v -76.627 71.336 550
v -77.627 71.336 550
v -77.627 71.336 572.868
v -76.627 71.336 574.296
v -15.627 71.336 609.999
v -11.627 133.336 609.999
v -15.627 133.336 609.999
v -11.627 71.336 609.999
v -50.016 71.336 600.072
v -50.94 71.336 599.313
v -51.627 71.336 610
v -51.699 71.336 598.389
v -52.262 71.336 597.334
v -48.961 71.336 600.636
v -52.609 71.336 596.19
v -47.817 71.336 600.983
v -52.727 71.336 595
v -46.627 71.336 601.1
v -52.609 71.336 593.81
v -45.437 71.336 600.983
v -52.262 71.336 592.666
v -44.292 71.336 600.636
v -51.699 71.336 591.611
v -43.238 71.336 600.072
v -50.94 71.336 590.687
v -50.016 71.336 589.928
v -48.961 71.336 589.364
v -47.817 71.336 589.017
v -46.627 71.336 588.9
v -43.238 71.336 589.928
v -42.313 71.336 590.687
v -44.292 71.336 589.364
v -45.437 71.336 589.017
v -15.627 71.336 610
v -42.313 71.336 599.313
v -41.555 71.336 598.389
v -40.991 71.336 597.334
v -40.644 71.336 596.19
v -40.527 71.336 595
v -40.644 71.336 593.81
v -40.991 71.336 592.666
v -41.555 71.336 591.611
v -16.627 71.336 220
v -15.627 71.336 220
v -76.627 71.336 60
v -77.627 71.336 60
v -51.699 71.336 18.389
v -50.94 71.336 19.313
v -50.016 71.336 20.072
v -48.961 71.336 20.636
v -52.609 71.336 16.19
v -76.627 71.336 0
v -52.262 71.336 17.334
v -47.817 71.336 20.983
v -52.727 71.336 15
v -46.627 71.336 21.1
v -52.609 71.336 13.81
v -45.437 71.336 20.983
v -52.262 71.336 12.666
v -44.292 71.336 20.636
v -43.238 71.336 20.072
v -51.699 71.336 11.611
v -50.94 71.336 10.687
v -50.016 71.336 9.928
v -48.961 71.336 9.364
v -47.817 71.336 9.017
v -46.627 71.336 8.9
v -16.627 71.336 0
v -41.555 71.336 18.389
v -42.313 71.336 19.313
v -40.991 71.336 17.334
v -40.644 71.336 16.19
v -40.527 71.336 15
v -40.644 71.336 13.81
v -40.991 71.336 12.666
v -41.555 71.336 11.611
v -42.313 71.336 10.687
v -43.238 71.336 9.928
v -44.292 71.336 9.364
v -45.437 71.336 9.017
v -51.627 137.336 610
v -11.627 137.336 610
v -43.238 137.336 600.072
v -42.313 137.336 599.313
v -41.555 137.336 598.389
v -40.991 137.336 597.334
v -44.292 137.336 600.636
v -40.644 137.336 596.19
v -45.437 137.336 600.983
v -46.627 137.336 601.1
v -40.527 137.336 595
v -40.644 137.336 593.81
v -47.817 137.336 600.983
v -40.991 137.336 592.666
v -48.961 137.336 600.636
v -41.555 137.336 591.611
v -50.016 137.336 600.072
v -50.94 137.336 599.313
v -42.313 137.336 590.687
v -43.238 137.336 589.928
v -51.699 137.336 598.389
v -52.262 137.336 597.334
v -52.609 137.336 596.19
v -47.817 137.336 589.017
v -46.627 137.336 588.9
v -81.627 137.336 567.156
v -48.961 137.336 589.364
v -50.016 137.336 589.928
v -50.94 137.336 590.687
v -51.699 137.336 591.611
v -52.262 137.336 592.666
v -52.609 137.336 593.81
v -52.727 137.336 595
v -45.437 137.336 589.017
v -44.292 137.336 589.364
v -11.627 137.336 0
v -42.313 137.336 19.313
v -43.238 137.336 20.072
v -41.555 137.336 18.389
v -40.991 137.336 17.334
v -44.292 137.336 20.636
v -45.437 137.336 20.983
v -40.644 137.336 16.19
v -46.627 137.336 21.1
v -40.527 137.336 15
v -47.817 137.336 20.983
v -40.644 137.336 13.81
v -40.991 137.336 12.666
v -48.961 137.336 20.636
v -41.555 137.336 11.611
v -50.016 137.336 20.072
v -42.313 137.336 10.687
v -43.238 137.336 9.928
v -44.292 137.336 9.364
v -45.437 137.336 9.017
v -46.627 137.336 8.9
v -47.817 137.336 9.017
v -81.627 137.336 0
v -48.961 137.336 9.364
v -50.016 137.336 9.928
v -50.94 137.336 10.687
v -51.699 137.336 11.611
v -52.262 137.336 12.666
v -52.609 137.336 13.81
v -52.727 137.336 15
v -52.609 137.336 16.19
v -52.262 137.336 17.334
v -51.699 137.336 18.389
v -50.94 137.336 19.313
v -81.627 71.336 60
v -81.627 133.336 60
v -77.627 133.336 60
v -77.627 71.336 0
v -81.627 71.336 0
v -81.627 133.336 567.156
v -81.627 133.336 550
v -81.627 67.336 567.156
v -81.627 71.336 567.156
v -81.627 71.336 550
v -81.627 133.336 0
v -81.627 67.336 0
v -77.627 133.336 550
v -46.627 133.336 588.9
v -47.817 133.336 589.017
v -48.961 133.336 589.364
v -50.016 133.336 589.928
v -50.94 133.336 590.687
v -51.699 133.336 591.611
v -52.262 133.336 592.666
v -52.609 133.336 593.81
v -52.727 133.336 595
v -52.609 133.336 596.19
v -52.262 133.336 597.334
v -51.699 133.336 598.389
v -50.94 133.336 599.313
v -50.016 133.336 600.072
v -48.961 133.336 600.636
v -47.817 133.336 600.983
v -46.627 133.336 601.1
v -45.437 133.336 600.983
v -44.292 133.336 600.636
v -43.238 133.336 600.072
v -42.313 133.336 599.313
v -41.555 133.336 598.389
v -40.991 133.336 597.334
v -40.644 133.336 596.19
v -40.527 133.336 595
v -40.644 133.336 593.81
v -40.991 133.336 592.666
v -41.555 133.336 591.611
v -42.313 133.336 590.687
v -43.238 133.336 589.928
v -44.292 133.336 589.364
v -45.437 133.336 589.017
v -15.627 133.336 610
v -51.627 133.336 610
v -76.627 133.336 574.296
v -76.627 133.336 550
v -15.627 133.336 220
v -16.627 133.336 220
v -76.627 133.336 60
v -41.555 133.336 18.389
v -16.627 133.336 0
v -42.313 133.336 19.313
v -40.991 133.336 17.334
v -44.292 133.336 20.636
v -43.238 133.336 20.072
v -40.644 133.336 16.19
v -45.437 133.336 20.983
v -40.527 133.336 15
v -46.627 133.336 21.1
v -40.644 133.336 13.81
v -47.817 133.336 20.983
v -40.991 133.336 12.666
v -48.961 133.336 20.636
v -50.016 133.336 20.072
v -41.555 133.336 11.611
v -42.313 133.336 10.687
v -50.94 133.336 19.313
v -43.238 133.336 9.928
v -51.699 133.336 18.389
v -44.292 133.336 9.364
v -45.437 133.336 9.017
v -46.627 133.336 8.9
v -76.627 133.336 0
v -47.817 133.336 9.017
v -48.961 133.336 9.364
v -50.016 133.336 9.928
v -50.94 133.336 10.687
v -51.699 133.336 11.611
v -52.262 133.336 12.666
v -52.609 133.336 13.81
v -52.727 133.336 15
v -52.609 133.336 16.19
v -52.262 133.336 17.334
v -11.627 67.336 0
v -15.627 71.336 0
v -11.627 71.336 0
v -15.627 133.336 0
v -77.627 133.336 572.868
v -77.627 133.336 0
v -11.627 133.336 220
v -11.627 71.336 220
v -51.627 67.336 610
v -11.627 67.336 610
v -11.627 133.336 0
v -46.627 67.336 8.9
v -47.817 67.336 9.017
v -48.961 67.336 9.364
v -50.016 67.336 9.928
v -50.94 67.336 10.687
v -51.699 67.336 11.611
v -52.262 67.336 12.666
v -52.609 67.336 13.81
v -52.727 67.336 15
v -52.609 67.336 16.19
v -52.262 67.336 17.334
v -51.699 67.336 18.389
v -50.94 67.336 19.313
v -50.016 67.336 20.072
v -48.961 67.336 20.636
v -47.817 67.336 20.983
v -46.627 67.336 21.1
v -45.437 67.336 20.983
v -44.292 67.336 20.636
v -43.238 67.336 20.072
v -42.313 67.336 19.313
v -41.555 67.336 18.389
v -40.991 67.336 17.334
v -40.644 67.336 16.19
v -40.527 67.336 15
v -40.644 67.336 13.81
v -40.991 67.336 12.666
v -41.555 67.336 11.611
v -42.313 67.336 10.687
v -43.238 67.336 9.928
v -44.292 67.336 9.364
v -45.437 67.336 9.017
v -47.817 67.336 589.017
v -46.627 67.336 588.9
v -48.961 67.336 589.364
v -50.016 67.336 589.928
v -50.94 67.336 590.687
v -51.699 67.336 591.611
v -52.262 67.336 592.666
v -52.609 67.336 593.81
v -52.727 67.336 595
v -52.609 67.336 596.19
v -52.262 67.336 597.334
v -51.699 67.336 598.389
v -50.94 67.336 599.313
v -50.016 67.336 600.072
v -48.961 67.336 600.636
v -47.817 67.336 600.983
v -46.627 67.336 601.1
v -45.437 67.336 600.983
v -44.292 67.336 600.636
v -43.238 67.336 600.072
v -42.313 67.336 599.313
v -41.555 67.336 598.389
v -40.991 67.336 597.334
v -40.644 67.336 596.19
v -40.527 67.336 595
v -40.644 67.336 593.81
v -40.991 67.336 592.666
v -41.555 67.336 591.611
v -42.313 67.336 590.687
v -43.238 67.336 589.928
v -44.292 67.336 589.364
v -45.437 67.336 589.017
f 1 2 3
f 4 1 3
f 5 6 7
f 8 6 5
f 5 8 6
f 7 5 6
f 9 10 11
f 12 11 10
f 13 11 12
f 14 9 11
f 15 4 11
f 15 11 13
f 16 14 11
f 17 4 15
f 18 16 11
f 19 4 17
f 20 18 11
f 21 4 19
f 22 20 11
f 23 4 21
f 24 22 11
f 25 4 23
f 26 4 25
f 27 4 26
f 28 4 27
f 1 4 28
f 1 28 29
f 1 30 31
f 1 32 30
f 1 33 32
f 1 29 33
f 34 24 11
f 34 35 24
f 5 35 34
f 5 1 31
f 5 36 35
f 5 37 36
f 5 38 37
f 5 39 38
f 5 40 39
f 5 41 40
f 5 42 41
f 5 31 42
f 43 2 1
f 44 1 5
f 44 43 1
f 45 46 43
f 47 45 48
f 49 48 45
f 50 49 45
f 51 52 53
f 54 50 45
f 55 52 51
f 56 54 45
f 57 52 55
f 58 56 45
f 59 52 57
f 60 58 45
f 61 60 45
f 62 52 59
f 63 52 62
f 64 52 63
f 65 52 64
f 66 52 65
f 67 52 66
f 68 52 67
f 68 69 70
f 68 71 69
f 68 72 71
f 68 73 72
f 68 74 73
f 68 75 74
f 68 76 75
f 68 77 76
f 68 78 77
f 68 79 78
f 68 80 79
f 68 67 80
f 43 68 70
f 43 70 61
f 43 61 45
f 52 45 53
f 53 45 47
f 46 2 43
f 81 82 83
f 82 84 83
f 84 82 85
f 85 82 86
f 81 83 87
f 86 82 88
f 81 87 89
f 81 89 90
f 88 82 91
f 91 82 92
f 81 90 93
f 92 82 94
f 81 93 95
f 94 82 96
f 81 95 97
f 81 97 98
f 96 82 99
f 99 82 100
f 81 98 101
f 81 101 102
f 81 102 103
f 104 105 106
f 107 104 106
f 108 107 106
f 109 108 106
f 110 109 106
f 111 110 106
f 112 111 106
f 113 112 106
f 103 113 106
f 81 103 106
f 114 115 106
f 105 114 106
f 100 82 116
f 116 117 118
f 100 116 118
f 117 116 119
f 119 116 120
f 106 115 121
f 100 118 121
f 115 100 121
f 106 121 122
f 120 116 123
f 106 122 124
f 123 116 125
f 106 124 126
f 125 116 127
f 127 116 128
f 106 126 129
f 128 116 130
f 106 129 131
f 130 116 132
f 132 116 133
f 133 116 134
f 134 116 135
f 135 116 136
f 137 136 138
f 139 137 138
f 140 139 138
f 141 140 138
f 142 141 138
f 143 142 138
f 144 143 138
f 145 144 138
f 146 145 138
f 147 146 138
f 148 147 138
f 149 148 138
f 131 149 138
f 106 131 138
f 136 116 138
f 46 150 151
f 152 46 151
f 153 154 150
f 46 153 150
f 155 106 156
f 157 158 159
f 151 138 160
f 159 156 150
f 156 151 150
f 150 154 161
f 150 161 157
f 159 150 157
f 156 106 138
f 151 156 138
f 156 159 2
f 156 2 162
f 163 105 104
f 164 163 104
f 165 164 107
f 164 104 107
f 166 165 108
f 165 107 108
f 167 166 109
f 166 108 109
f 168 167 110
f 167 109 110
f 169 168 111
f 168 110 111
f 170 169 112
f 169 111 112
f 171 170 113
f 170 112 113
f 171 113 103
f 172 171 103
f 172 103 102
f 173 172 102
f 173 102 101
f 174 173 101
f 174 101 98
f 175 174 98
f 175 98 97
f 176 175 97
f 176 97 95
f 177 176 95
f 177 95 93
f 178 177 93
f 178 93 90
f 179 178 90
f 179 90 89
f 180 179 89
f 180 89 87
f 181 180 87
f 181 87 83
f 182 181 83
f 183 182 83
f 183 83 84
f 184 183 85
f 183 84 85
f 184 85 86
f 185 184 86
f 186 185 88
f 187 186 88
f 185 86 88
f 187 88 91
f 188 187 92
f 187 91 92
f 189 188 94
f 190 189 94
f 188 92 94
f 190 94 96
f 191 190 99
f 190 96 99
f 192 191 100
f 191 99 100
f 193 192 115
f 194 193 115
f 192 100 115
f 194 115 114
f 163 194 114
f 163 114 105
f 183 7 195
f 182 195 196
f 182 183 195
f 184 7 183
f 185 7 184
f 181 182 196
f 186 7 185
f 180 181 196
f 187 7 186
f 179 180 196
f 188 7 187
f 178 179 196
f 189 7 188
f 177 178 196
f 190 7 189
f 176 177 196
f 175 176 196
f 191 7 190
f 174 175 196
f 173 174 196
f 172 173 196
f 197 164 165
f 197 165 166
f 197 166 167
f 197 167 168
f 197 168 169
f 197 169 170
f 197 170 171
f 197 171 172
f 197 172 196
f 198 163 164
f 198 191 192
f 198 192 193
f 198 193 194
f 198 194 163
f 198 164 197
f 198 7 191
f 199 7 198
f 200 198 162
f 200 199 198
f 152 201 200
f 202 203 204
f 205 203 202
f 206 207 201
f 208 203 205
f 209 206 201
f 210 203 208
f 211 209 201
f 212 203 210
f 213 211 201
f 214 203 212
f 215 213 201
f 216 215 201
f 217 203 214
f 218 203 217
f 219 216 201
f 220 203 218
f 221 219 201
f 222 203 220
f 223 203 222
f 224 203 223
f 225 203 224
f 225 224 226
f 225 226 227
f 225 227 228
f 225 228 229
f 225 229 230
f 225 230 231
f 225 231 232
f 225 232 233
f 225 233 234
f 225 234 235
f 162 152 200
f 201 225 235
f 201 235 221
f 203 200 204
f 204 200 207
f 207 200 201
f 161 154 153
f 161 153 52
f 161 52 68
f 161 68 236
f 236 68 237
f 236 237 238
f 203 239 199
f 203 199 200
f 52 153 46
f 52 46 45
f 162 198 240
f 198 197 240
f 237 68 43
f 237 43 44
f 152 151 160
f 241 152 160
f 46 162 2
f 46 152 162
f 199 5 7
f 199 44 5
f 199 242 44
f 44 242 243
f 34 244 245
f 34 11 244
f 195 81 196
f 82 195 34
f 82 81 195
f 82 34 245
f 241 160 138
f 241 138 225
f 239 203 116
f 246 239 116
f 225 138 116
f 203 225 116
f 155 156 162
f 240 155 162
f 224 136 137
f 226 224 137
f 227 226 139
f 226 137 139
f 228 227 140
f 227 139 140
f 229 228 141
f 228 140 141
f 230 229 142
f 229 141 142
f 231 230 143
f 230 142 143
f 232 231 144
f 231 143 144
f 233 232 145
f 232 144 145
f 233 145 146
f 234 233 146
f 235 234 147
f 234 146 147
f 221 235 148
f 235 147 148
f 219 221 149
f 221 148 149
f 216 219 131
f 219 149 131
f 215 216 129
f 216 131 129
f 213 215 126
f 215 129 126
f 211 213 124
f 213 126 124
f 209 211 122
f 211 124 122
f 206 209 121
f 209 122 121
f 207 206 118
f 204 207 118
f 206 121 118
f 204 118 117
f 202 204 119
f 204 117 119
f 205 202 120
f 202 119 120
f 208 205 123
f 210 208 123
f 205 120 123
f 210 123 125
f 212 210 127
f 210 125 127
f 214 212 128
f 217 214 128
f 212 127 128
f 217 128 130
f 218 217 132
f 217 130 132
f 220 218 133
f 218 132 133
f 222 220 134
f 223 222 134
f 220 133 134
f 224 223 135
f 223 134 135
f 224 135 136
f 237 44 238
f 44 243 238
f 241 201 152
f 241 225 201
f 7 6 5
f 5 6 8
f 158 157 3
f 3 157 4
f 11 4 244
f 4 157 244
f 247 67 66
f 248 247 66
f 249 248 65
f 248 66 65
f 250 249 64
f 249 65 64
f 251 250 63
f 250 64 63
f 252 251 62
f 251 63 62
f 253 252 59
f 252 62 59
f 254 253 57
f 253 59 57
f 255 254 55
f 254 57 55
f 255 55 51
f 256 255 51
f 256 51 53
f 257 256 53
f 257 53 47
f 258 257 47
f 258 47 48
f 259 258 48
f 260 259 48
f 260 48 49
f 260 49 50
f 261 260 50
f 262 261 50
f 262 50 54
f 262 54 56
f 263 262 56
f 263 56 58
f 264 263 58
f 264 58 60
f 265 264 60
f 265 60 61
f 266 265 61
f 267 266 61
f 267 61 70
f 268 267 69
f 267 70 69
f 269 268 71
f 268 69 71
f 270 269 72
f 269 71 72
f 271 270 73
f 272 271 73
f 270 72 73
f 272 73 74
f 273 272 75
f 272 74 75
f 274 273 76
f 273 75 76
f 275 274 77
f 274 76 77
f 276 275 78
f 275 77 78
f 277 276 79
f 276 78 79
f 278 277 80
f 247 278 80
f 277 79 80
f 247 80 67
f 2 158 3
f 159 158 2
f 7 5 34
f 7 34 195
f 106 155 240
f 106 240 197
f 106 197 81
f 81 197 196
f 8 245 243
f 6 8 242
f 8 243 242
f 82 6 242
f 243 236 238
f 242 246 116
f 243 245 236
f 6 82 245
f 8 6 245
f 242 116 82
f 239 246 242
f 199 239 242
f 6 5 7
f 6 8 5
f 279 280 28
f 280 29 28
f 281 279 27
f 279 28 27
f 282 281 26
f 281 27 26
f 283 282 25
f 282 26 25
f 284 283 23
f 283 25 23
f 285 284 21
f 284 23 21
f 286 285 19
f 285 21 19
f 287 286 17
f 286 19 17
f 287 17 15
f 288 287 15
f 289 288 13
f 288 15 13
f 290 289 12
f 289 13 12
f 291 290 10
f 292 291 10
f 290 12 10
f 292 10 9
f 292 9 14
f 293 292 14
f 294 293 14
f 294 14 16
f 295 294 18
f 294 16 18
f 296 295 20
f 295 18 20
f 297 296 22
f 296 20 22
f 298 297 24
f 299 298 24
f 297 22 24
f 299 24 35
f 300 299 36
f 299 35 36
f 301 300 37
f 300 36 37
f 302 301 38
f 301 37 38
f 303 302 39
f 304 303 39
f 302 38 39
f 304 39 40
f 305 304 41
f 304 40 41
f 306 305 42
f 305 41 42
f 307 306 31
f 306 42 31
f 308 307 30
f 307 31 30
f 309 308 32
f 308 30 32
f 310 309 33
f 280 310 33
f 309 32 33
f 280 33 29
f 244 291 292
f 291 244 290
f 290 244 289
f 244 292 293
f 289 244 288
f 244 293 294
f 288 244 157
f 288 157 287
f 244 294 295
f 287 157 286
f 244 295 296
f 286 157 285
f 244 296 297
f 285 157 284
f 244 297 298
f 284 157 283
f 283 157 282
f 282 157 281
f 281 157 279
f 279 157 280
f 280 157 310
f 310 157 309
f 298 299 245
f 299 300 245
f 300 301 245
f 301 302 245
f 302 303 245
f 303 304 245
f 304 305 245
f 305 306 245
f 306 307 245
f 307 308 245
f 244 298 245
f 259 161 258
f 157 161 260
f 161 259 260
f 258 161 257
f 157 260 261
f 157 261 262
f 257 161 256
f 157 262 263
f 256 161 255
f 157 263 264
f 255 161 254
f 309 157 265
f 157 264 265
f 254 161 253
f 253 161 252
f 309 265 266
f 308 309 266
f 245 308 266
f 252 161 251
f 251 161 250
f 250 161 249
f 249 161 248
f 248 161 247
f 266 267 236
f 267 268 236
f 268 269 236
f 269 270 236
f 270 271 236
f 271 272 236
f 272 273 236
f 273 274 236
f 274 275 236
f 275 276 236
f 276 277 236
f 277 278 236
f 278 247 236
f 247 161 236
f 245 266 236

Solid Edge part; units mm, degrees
sketch "Sketch1" plane through (0, 0, 0) normal (0, 0, 1) x (1, 0, 0)
  line L0 (-81.6266, 67.336) -> (-11.6266, 67.336)
  line L1 (-11.6266, 67.336) -> (-11.6266, 137.336)
  line L2 (-11.6266, 137.336) -> (-81.6266, 137.336)
  line L3 (-81.6266, 137.336) -> (-81.6266, 67.336)
  line L4 (-77.6266, 71.336) -> (-15.6266, 71.336)
  line L5 (-15.6266, 71.336) -> (-15.6266, 133.336)
  line L6 (-15.6266, 133.336) -> (-77.6266, 133.336)
  line L7 (-77.6266, 133.336) -> (-77.6266, 71.336)
  dimension "D1" = 70
  dimension "D2" = 70
  dimension "D3" = 4
  dimension "D4" = 4
extrude "Protrusion1" add sketch "Sketch1" along normal blind 610
sketch "Sketch2" plane through (-56.6266, 137.336, 367.5) normal (0, 1, 0) x (0, 0, -1)
  circle A0 centre (352.5, -10) radius 6.1
  circle A1 centre (-227.5, -10) radius 6.1
  dimension "D1" = 15
  dimension "D2" = 15
  dimension "D3" = 12.2
  dimension "D4" = 12.2
extrude "Cutout1" cut sketch "Sketch2" against normal through all
sketch "Sketch3" plane through (-11.6266, 92.336, 367.5) normal (1, 0, 0) x (0, 0, -1)
  line L0 (147.5, -21) -> (367.5, -21)
  line L1 (367.5, -21) -> (367.5, 41)
  line L2 (367.5, 41) -> (147.5, 41)
  line L3 (147.5, 41) -> (147.5, -21)
  line L4 (-242.5, 41) -> (-242.499, 41) construction
  line L5 (-242.499, 41) -> (-242.499, -21)
  line L6 (-242.499, -21) -> (-242.5, -21) construction
  line L7 (-242.5, -21) -> (-242.5, 41)
  dimension "D1" = 0.001
  dimension "D2" = 62
  dimension "D3" = 62
  dimension "D4" = 220
extrude "Cutout2" cut sketch "Sketch3" against normal blind 5
sketch "Sketch4" plane through (-81.6266, 92.336, 367.5) normal (-1, 0, 0) x (0, 0, -1)
  line L0 (307.5, -41) -> (367.5, -41)
  line L1 (367.5, -41) -> (367.5, 21)
  line L2 (367.5, 21) -> (307.5, 21)
  line L3 (307.5, 21) -> (307.5, -41)
  line L4 (-242.5, 21) -> (-182.5, 21)
  line L5 (-182.5, 21) -> (-182.5, -41)
  line L6 (-182.5, -41) -> (-242.5, -41)
  line L7 (-242.5, -41) -> (-242.5, 21)
  dimension "D1" = 60
  dimension "D2" = 62
  dimension "D3" = 60
  dimension "D4" = 62
extrude "ExtrudedCutout_3" cut sketch "Sketch4" against normal blind 5
sketch "Sketch5" plane through (-46.6266, 67.336, 367.5) normal (0, -1, 0) x (0, 0, 1)
  line L0 (242.5, 35) -> (199.6556, 35)
  line L1 (199.6556, 35) -> (242.5, 5)
  line L2 (242.5, 5) -> (242.5, 35)
  dimension "D1" = 30
extrude "Cutout3" cut sketch "Sketch5" against normal through all
properties material "Aluminum, 6061-T6"
